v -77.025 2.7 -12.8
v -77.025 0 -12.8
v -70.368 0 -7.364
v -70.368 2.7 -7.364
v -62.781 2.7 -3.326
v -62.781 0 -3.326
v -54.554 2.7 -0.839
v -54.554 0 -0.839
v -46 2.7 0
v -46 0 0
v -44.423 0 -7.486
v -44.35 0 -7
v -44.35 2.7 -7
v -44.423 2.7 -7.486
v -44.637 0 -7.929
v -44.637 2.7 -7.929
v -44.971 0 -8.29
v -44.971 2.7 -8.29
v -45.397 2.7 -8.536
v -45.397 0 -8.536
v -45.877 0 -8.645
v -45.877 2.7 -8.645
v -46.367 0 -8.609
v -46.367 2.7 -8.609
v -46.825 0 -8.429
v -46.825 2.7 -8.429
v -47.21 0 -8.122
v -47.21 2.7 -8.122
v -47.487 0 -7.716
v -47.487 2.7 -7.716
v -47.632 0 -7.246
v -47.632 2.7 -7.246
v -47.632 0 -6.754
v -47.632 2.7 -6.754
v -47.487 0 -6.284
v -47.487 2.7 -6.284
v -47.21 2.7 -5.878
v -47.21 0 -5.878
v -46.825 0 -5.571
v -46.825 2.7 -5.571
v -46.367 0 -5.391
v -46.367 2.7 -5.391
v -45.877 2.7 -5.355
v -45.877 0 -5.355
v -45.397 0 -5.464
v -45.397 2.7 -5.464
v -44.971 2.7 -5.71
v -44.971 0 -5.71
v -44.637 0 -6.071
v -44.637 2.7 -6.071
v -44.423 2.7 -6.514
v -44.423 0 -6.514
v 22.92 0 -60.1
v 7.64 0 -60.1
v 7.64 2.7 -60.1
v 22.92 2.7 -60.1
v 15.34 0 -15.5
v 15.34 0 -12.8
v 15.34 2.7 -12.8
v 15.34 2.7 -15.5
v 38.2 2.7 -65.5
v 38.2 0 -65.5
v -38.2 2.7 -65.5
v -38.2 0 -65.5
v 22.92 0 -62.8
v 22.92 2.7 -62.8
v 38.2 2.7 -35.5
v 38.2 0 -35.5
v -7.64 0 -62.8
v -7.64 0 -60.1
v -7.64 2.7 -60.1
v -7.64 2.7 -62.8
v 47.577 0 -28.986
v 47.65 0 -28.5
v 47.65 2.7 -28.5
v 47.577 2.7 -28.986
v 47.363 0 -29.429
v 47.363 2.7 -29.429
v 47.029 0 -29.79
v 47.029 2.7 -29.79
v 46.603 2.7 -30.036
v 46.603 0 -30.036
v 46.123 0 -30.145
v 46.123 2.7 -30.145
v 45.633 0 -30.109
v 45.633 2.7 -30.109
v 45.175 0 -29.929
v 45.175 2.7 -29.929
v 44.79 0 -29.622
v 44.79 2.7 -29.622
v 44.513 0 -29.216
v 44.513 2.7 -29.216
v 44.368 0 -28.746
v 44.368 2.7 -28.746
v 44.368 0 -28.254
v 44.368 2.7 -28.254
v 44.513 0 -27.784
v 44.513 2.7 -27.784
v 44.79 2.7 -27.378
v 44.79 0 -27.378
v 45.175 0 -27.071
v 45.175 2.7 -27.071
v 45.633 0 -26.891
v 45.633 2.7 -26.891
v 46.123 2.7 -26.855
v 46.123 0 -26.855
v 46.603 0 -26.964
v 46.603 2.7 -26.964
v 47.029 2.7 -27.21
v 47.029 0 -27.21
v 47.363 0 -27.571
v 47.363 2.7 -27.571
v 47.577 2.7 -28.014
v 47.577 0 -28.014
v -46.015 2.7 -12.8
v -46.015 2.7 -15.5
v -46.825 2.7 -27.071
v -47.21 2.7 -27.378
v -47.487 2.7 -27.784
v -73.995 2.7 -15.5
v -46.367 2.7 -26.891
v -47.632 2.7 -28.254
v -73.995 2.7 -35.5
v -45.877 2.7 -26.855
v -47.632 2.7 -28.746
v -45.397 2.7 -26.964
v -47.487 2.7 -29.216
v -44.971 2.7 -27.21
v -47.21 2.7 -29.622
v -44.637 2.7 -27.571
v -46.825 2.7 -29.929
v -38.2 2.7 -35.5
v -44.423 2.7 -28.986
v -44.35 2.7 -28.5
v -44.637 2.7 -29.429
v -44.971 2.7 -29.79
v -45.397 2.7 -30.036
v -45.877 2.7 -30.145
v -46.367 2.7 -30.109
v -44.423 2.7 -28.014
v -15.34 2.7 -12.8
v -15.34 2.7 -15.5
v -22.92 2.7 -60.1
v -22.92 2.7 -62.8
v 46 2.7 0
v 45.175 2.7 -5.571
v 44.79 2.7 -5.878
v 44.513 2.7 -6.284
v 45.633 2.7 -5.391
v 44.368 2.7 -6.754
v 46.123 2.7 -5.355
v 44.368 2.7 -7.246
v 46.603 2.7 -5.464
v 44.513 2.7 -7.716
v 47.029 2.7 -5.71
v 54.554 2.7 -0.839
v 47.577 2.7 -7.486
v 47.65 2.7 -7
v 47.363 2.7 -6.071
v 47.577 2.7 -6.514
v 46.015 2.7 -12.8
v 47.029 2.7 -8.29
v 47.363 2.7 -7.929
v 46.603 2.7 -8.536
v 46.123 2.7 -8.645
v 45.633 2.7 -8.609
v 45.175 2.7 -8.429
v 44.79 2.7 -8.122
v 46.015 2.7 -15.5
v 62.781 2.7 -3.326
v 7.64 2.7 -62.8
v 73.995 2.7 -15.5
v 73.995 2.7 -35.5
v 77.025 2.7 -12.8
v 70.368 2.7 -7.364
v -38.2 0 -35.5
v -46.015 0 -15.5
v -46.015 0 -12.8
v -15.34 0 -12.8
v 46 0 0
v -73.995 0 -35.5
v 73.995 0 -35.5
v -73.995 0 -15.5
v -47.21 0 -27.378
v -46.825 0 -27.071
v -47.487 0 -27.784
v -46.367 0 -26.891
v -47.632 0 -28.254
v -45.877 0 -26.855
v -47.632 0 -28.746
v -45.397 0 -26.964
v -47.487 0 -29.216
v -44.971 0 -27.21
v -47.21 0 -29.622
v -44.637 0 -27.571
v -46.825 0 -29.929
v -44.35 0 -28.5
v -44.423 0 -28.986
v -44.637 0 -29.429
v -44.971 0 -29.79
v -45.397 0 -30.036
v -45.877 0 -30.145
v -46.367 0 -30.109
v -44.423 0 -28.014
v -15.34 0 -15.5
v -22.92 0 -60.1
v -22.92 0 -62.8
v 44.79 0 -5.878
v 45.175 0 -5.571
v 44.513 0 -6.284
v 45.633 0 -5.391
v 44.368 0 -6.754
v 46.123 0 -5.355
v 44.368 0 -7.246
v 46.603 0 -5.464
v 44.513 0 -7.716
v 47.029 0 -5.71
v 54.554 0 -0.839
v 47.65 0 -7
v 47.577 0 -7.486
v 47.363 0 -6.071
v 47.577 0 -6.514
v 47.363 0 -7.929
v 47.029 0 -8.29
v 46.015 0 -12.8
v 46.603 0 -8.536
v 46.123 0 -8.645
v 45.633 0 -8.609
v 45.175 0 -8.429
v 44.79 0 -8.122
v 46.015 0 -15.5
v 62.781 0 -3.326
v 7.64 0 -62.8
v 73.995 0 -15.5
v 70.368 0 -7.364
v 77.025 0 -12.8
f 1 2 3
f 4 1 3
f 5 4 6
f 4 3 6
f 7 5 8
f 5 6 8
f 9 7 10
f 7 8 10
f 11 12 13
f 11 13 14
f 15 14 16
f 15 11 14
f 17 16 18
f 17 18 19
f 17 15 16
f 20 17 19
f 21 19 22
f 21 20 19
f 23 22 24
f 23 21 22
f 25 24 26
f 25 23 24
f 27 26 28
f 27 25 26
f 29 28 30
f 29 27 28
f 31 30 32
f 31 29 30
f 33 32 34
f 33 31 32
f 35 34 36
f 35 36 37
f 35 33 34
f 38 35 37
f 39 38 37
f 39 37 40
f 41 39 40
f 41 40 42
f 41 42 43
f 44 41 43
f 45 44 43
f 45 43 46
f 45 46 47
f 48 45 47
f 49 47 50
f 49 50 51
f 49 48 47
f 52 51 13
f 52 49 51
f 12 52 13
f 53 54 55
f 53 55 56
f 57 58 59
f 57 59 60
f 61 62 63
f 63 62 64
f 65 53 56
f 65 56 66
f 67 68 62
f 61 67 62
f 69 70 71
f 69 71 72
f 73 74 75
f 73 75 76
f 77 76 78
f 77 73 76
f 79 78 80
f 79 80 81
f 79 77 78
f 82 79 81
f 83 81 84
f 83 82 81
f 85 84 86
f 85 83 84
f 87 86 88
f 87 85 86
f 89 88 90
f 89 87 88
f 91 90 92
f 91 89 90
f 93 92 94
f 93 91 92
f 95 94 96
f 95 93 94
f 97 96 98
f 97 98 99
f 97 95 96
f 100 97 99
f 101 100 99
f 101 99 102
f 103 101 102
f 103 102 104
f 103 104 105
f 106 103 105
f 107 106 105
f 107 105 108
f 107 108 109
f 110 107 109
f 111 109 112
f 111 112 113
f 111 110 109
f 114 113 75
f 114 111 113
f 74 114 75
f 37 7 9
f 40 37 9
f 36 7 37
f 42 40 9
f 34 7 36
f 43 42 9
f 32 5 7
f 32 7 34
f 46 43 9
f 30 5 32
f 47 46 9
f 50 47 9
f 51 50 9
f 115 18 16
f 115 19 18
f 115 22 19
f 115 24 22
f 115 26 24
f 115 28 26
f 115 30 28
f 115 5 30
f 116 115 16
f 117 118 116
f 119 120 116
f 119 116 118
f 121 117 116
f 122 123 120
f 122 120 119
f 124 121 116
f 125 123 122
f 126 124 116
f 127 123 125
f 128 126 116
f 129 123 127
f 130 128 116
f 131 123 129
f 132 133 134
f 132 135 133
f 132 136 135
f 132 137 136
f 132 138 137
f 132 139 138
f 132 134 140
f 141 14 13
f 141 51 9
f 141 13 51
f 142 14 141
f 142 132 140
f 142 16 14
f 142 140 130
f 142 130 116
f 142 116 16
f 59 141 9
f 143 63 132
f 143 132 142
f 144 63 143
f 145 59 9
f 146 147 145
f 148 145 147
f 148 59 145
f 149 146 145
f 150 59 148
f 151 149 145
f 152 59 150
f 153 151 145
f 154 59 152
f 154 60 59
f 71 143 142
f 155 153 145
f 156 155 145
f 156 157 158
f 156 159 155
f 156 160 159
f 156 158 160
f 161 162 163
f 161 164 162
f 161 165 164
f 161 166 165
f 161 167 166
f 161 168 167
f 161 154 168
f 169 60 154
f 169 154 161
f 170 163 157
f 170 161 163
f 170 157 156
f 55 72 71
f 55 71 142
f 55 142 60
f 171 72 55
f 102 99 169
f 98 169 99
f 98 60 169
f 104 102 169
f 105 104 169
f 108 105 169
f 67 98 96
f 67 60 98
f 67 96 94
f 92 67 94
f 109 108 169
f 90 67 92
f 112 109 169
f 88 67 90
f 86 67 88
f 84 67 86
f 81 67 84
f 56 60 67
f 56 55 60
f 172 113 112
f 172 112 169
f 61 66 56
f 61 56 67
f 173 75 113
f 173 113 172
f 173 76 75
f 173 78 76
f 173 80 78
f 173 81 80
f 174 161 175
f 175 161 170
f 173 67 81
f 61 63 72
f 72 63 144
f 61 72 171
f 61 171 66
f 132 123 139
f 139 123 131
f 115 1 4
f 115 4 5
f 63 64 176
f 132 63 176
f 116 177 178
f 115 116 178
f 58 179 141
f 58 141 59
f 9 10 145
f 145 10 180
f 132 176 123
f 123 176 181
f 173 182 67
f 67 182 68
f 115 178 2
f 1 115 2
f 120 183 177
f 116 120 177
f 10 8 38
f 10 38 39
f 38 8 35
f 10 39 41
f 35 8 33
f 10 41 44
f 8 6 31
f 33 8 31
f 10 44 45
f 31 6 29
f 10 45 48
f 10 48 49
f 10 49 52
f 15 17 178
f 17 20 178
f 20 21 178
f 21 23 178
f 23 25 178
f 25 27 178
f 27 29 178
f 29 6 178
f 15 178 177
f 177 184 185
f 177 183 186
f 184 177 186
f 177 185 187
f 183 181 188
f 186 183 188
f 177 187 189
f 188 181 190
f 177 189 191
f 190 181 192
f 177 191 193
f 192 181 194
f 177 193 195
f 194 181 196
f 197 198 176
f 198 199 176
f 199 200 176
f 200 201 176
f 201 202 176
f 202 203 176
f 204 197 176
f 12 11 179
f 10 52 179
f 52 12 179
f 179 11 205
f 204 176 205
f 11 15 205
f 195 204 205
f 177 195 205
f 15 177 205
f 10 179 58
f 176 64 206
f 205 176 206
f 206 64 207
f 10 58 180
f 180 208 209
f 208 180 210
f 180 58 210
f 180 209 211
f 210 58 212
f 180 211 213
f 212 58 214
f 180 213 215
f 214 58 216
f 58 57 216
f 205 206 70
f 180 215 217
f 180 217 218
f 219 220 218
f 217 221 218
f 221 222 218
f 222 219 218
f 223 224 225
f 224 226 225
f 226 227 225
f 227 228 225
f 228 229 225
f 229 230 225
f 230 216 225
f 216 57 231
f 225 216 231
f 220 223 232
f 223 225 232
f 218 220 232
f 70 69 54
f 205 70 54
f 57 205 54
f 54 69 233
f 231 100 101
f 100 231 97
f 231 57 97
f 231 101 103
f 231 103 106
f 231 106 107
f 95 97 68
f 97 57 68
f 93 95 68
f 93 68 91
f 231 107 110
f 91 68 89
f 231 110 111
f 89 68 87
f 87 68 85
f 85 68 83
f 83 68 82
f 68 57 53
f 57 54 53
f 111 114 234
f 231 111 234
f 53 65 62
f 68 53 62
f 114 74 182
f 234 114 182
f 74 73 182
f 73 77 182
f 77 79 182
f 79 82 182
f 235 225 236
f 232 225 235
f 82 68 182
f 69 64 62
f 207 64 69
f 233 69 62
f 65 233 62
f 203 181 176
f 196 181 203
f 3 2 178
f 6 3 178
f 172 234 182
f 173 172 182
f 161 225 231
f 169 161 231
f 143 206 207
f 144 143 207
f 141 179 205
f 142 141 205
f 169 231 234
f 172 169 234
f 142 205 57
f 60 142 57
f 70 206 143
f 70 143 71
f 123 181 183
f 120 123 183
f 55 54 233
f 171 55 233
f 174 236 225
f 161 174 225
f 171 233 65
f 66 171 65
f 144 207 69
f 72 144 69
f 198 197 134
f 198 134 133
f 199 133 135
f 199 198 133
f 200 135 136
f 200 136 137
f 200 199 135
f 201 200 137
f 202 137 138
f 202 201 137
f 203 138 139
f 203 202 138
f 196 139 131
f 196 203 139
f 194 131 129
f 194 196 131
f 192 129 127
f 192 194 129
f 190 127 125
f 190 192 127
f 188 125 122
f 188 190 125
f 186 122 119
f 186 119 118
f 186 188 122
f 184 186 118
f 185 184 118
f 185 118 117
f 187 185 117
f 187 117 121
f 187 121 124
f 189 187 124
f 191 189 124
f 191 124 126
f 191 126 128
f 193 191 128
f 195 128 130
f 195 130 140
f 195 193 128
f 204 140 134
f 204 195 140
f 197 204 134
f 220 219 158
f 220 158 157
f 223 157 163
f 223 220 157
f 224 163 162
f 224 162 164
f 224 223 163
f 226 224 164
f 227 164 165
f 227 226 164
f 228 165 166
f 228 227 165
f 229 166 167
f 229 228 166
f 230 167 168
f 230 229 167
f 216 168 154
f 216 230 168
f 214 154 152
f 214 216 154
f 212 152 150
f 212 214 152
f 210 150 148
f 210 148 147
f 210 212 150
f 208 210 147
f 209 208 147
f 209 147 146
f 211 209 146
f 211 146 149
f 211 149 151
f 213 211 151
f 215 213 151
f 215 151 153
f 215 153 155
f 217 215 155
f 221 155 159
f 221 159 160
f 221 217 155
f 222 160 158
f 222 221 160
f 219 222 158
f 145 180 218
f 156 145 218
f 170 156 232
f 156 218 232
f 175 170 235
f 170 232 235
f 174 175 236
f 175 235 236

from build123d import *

# Parameters (mm, degrees)
SKETCH1_R           = 1.65
SKETCH1_W           = 30.68
SKETCH1_H           = 2.7
SKETCH1_W_2         = 15.28
BOSS_EXTRUDE1_DEPTH = 2.7


with BuildPart() as part:
    # Sketch1 → Boss-Extrude1 (new body)
    with BuildSketch(Plane(origin=(0, 0, 0), x_dir=(1, 0, 0), z_dir=(0, 1, 0))):
        with BuildLine():
            Line((-46, 0), (46, 0))
            ThreePointArc((46, 0), (62.780941571, 3.32568378), (77.025151087, 12.8))
            Line((77.025151087, 12.8), (46.015151087, 12.8))
            Line((46.015151087, 12.8), (46.015151087, 15.5))
            Line((46.015151087, 15.5), (73.995151087, 15.5))
            Line((73.995151087, 15.5), (73.995151087, 35.5))
            Line((73.995151087, 35.5), (38.2, 35.5))
            Line((38.2, 35.5), (38.2, 65.5))
            Line((38.2, 65.5), (-38.2, 65.5))
            Line((-38.2, 65.5), (-38.2, 35.5))
            Line((-38.2, 35.5), (-73.995151087, 35.5))
            Line((-73.995151087, 35.5), (-73.995151087, 15.5))
            Line((-73.995151087, 15.5), (-46.015151087, 15.5))
            Line((-46.015151087, 15.5), (-46.015151087, 12.8))
            Line((-46.015151087, 12.8), (-77.025151087, 12.8))
            ThreePointArc((-77.025151087, 12.8), (-62.780941571, 3.32568378), (-46, 0))
        make_face()
        with Locations((46, 28.5)):
            Circle(SKETCH1_R, mode=Mode.SUBTRACT)
        with Locations((46, 7)):
            Circle(SKETCH1_R, mode=Mode.SUBTRACT)
        with Locations((-46, 7)):
            Circle(SKETCH1_R, mode=Mode.SUBTRACT)
        with Locations((-46, 28.5)):
            Circle(SKETCH1_R, mode=Mode.SUBTRACT)
        with Locations((0, 14.15)):
            Rectangle(SKETCH1_W, SKETCH1_H, mode=Mode.SUBTRACT)
        with Locations((-15.28, 61.45)):
            Rectangle(SKETCH1_W_2, SKETCH1_H, mode=Mode.SUBTRACT)
        with Locations((15.28, 61.45)):
            Rectangle(SKETCH1_W_2, SKETCH1_H, mode=Mode.SUBTRACT)
    extrude(amount=BOSS_EXTRUDE1_DEPTH)


solid = part.part
